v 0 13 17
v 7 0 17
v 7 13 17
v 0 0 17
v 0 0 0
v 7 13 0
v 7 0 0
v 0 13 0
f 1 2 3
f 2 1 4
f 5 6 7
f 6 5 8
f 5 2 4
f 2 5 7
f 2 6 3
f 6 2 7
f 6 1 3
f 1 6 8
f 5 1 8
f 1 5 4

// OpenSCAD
// Generated by SolidPython 1.0.1 on 2020-07-29 00:46:55


cube(size = [7, 13, 17]);
/***********************************************
*********      SolidPython code:      **********
************************************************
 
# import packages: SolidPython
from solid import *
from solid.utils import *
from itertools import chain, combinations, permutations


class Resize:

    def __init__(self, scad_file):
        self.scad_file = scad_file
        #self.scad_file = import_scad(scad_file)
        # cone/cylinder param:
        self.r1 = 0
        self.r2 = 0
        self.h = 0
        # rectangular prism param:
        self.w = 0
        self.l = 0
        # ellipse param:
        self.r = 0

    # import OpenScad code (file name corresponds to shape)


    # classify shape + parameters
    def assign(self, param1, param2, param3):
        if self.scad_file == 'cone.scad':
            self.r1 = param1
            self.r2 = param2
            self.h = param3
        elif self.scad_file == 'cylinder.scad':
            self.r1 = param1
            self.r2 = param2
            self.h = param3
        elif self.scad_file == 'rectangularPrism.scad':
            self.h = param1
            self.l = param2
            self.w = param3
        else:
            self.r = param1
            self.h = param2

    # resize parameters
    def iterate(self):
        x = range(3, 20, 2)
        i = 1
        if self.scad_file == 'cone.scad':
            tempList = list(permutations(x, 2))
            for temp in tempList:
                param1 = temp[0]
                param2 = temp[1]
                filepath = 'produced_scad_files/' + 'cone' + str(param1) + '_' + str(param2) + '_' + '.scad'
                scad_render_to_file(cylinder(h=param1, r1=param2, r2=0), filepath)

        elif self.scad_file == 'cylinder.scad':
            tempList = list(permutations(x, 3))
            for temp in tempList:
                param1 = temp[0]
                param2 = temp[1]
                filepath = 'produced_scad_files/' + 'cylinder' + str(param1) + '_' + str(param2) + '_' + '.scad'
                scad_render_to_file(cylinder(h=param1, r1=param2, r2=param2), filepath)

        elif self.scad_file == 'rectangularPrism.scad':
            tempList = list(permutations(x, 3))
            for temp in tempList:
                param1 = temp[0]
                param2 = temp[1]
                param3 = temp[2]
                filepath = 'produced_scad_files/' + 'rectangularPrism' + str(param1) + '_' + str(param2) + '_' + str(
                    param3) + '.scad'
                scad_render_to_file(cube(size=(param1, param2, param3)), filepath)

        elif self.scad_file == 'ellipse.scad':
            tempList = list(permutations(x, 4))
            for temp in tempList:
                param1 = temp[0]
                param2 = temp[1]
                param3 = temp[2]
                param4 = temp[3]
                filepath = 'produced_scad_files/' + 'ellipse' + str(param1) + '_' + str(param2) + '_' + str(param3) + '_' + str(param4) + '.scad'
                scad_render_to_file(scale([param1, param2, param3])(sphere(r=param4)), filepath)

    def render_to_scadfile(self):
        scad_render_to_file(scad, 'example.scad') 
 
************************************************/
